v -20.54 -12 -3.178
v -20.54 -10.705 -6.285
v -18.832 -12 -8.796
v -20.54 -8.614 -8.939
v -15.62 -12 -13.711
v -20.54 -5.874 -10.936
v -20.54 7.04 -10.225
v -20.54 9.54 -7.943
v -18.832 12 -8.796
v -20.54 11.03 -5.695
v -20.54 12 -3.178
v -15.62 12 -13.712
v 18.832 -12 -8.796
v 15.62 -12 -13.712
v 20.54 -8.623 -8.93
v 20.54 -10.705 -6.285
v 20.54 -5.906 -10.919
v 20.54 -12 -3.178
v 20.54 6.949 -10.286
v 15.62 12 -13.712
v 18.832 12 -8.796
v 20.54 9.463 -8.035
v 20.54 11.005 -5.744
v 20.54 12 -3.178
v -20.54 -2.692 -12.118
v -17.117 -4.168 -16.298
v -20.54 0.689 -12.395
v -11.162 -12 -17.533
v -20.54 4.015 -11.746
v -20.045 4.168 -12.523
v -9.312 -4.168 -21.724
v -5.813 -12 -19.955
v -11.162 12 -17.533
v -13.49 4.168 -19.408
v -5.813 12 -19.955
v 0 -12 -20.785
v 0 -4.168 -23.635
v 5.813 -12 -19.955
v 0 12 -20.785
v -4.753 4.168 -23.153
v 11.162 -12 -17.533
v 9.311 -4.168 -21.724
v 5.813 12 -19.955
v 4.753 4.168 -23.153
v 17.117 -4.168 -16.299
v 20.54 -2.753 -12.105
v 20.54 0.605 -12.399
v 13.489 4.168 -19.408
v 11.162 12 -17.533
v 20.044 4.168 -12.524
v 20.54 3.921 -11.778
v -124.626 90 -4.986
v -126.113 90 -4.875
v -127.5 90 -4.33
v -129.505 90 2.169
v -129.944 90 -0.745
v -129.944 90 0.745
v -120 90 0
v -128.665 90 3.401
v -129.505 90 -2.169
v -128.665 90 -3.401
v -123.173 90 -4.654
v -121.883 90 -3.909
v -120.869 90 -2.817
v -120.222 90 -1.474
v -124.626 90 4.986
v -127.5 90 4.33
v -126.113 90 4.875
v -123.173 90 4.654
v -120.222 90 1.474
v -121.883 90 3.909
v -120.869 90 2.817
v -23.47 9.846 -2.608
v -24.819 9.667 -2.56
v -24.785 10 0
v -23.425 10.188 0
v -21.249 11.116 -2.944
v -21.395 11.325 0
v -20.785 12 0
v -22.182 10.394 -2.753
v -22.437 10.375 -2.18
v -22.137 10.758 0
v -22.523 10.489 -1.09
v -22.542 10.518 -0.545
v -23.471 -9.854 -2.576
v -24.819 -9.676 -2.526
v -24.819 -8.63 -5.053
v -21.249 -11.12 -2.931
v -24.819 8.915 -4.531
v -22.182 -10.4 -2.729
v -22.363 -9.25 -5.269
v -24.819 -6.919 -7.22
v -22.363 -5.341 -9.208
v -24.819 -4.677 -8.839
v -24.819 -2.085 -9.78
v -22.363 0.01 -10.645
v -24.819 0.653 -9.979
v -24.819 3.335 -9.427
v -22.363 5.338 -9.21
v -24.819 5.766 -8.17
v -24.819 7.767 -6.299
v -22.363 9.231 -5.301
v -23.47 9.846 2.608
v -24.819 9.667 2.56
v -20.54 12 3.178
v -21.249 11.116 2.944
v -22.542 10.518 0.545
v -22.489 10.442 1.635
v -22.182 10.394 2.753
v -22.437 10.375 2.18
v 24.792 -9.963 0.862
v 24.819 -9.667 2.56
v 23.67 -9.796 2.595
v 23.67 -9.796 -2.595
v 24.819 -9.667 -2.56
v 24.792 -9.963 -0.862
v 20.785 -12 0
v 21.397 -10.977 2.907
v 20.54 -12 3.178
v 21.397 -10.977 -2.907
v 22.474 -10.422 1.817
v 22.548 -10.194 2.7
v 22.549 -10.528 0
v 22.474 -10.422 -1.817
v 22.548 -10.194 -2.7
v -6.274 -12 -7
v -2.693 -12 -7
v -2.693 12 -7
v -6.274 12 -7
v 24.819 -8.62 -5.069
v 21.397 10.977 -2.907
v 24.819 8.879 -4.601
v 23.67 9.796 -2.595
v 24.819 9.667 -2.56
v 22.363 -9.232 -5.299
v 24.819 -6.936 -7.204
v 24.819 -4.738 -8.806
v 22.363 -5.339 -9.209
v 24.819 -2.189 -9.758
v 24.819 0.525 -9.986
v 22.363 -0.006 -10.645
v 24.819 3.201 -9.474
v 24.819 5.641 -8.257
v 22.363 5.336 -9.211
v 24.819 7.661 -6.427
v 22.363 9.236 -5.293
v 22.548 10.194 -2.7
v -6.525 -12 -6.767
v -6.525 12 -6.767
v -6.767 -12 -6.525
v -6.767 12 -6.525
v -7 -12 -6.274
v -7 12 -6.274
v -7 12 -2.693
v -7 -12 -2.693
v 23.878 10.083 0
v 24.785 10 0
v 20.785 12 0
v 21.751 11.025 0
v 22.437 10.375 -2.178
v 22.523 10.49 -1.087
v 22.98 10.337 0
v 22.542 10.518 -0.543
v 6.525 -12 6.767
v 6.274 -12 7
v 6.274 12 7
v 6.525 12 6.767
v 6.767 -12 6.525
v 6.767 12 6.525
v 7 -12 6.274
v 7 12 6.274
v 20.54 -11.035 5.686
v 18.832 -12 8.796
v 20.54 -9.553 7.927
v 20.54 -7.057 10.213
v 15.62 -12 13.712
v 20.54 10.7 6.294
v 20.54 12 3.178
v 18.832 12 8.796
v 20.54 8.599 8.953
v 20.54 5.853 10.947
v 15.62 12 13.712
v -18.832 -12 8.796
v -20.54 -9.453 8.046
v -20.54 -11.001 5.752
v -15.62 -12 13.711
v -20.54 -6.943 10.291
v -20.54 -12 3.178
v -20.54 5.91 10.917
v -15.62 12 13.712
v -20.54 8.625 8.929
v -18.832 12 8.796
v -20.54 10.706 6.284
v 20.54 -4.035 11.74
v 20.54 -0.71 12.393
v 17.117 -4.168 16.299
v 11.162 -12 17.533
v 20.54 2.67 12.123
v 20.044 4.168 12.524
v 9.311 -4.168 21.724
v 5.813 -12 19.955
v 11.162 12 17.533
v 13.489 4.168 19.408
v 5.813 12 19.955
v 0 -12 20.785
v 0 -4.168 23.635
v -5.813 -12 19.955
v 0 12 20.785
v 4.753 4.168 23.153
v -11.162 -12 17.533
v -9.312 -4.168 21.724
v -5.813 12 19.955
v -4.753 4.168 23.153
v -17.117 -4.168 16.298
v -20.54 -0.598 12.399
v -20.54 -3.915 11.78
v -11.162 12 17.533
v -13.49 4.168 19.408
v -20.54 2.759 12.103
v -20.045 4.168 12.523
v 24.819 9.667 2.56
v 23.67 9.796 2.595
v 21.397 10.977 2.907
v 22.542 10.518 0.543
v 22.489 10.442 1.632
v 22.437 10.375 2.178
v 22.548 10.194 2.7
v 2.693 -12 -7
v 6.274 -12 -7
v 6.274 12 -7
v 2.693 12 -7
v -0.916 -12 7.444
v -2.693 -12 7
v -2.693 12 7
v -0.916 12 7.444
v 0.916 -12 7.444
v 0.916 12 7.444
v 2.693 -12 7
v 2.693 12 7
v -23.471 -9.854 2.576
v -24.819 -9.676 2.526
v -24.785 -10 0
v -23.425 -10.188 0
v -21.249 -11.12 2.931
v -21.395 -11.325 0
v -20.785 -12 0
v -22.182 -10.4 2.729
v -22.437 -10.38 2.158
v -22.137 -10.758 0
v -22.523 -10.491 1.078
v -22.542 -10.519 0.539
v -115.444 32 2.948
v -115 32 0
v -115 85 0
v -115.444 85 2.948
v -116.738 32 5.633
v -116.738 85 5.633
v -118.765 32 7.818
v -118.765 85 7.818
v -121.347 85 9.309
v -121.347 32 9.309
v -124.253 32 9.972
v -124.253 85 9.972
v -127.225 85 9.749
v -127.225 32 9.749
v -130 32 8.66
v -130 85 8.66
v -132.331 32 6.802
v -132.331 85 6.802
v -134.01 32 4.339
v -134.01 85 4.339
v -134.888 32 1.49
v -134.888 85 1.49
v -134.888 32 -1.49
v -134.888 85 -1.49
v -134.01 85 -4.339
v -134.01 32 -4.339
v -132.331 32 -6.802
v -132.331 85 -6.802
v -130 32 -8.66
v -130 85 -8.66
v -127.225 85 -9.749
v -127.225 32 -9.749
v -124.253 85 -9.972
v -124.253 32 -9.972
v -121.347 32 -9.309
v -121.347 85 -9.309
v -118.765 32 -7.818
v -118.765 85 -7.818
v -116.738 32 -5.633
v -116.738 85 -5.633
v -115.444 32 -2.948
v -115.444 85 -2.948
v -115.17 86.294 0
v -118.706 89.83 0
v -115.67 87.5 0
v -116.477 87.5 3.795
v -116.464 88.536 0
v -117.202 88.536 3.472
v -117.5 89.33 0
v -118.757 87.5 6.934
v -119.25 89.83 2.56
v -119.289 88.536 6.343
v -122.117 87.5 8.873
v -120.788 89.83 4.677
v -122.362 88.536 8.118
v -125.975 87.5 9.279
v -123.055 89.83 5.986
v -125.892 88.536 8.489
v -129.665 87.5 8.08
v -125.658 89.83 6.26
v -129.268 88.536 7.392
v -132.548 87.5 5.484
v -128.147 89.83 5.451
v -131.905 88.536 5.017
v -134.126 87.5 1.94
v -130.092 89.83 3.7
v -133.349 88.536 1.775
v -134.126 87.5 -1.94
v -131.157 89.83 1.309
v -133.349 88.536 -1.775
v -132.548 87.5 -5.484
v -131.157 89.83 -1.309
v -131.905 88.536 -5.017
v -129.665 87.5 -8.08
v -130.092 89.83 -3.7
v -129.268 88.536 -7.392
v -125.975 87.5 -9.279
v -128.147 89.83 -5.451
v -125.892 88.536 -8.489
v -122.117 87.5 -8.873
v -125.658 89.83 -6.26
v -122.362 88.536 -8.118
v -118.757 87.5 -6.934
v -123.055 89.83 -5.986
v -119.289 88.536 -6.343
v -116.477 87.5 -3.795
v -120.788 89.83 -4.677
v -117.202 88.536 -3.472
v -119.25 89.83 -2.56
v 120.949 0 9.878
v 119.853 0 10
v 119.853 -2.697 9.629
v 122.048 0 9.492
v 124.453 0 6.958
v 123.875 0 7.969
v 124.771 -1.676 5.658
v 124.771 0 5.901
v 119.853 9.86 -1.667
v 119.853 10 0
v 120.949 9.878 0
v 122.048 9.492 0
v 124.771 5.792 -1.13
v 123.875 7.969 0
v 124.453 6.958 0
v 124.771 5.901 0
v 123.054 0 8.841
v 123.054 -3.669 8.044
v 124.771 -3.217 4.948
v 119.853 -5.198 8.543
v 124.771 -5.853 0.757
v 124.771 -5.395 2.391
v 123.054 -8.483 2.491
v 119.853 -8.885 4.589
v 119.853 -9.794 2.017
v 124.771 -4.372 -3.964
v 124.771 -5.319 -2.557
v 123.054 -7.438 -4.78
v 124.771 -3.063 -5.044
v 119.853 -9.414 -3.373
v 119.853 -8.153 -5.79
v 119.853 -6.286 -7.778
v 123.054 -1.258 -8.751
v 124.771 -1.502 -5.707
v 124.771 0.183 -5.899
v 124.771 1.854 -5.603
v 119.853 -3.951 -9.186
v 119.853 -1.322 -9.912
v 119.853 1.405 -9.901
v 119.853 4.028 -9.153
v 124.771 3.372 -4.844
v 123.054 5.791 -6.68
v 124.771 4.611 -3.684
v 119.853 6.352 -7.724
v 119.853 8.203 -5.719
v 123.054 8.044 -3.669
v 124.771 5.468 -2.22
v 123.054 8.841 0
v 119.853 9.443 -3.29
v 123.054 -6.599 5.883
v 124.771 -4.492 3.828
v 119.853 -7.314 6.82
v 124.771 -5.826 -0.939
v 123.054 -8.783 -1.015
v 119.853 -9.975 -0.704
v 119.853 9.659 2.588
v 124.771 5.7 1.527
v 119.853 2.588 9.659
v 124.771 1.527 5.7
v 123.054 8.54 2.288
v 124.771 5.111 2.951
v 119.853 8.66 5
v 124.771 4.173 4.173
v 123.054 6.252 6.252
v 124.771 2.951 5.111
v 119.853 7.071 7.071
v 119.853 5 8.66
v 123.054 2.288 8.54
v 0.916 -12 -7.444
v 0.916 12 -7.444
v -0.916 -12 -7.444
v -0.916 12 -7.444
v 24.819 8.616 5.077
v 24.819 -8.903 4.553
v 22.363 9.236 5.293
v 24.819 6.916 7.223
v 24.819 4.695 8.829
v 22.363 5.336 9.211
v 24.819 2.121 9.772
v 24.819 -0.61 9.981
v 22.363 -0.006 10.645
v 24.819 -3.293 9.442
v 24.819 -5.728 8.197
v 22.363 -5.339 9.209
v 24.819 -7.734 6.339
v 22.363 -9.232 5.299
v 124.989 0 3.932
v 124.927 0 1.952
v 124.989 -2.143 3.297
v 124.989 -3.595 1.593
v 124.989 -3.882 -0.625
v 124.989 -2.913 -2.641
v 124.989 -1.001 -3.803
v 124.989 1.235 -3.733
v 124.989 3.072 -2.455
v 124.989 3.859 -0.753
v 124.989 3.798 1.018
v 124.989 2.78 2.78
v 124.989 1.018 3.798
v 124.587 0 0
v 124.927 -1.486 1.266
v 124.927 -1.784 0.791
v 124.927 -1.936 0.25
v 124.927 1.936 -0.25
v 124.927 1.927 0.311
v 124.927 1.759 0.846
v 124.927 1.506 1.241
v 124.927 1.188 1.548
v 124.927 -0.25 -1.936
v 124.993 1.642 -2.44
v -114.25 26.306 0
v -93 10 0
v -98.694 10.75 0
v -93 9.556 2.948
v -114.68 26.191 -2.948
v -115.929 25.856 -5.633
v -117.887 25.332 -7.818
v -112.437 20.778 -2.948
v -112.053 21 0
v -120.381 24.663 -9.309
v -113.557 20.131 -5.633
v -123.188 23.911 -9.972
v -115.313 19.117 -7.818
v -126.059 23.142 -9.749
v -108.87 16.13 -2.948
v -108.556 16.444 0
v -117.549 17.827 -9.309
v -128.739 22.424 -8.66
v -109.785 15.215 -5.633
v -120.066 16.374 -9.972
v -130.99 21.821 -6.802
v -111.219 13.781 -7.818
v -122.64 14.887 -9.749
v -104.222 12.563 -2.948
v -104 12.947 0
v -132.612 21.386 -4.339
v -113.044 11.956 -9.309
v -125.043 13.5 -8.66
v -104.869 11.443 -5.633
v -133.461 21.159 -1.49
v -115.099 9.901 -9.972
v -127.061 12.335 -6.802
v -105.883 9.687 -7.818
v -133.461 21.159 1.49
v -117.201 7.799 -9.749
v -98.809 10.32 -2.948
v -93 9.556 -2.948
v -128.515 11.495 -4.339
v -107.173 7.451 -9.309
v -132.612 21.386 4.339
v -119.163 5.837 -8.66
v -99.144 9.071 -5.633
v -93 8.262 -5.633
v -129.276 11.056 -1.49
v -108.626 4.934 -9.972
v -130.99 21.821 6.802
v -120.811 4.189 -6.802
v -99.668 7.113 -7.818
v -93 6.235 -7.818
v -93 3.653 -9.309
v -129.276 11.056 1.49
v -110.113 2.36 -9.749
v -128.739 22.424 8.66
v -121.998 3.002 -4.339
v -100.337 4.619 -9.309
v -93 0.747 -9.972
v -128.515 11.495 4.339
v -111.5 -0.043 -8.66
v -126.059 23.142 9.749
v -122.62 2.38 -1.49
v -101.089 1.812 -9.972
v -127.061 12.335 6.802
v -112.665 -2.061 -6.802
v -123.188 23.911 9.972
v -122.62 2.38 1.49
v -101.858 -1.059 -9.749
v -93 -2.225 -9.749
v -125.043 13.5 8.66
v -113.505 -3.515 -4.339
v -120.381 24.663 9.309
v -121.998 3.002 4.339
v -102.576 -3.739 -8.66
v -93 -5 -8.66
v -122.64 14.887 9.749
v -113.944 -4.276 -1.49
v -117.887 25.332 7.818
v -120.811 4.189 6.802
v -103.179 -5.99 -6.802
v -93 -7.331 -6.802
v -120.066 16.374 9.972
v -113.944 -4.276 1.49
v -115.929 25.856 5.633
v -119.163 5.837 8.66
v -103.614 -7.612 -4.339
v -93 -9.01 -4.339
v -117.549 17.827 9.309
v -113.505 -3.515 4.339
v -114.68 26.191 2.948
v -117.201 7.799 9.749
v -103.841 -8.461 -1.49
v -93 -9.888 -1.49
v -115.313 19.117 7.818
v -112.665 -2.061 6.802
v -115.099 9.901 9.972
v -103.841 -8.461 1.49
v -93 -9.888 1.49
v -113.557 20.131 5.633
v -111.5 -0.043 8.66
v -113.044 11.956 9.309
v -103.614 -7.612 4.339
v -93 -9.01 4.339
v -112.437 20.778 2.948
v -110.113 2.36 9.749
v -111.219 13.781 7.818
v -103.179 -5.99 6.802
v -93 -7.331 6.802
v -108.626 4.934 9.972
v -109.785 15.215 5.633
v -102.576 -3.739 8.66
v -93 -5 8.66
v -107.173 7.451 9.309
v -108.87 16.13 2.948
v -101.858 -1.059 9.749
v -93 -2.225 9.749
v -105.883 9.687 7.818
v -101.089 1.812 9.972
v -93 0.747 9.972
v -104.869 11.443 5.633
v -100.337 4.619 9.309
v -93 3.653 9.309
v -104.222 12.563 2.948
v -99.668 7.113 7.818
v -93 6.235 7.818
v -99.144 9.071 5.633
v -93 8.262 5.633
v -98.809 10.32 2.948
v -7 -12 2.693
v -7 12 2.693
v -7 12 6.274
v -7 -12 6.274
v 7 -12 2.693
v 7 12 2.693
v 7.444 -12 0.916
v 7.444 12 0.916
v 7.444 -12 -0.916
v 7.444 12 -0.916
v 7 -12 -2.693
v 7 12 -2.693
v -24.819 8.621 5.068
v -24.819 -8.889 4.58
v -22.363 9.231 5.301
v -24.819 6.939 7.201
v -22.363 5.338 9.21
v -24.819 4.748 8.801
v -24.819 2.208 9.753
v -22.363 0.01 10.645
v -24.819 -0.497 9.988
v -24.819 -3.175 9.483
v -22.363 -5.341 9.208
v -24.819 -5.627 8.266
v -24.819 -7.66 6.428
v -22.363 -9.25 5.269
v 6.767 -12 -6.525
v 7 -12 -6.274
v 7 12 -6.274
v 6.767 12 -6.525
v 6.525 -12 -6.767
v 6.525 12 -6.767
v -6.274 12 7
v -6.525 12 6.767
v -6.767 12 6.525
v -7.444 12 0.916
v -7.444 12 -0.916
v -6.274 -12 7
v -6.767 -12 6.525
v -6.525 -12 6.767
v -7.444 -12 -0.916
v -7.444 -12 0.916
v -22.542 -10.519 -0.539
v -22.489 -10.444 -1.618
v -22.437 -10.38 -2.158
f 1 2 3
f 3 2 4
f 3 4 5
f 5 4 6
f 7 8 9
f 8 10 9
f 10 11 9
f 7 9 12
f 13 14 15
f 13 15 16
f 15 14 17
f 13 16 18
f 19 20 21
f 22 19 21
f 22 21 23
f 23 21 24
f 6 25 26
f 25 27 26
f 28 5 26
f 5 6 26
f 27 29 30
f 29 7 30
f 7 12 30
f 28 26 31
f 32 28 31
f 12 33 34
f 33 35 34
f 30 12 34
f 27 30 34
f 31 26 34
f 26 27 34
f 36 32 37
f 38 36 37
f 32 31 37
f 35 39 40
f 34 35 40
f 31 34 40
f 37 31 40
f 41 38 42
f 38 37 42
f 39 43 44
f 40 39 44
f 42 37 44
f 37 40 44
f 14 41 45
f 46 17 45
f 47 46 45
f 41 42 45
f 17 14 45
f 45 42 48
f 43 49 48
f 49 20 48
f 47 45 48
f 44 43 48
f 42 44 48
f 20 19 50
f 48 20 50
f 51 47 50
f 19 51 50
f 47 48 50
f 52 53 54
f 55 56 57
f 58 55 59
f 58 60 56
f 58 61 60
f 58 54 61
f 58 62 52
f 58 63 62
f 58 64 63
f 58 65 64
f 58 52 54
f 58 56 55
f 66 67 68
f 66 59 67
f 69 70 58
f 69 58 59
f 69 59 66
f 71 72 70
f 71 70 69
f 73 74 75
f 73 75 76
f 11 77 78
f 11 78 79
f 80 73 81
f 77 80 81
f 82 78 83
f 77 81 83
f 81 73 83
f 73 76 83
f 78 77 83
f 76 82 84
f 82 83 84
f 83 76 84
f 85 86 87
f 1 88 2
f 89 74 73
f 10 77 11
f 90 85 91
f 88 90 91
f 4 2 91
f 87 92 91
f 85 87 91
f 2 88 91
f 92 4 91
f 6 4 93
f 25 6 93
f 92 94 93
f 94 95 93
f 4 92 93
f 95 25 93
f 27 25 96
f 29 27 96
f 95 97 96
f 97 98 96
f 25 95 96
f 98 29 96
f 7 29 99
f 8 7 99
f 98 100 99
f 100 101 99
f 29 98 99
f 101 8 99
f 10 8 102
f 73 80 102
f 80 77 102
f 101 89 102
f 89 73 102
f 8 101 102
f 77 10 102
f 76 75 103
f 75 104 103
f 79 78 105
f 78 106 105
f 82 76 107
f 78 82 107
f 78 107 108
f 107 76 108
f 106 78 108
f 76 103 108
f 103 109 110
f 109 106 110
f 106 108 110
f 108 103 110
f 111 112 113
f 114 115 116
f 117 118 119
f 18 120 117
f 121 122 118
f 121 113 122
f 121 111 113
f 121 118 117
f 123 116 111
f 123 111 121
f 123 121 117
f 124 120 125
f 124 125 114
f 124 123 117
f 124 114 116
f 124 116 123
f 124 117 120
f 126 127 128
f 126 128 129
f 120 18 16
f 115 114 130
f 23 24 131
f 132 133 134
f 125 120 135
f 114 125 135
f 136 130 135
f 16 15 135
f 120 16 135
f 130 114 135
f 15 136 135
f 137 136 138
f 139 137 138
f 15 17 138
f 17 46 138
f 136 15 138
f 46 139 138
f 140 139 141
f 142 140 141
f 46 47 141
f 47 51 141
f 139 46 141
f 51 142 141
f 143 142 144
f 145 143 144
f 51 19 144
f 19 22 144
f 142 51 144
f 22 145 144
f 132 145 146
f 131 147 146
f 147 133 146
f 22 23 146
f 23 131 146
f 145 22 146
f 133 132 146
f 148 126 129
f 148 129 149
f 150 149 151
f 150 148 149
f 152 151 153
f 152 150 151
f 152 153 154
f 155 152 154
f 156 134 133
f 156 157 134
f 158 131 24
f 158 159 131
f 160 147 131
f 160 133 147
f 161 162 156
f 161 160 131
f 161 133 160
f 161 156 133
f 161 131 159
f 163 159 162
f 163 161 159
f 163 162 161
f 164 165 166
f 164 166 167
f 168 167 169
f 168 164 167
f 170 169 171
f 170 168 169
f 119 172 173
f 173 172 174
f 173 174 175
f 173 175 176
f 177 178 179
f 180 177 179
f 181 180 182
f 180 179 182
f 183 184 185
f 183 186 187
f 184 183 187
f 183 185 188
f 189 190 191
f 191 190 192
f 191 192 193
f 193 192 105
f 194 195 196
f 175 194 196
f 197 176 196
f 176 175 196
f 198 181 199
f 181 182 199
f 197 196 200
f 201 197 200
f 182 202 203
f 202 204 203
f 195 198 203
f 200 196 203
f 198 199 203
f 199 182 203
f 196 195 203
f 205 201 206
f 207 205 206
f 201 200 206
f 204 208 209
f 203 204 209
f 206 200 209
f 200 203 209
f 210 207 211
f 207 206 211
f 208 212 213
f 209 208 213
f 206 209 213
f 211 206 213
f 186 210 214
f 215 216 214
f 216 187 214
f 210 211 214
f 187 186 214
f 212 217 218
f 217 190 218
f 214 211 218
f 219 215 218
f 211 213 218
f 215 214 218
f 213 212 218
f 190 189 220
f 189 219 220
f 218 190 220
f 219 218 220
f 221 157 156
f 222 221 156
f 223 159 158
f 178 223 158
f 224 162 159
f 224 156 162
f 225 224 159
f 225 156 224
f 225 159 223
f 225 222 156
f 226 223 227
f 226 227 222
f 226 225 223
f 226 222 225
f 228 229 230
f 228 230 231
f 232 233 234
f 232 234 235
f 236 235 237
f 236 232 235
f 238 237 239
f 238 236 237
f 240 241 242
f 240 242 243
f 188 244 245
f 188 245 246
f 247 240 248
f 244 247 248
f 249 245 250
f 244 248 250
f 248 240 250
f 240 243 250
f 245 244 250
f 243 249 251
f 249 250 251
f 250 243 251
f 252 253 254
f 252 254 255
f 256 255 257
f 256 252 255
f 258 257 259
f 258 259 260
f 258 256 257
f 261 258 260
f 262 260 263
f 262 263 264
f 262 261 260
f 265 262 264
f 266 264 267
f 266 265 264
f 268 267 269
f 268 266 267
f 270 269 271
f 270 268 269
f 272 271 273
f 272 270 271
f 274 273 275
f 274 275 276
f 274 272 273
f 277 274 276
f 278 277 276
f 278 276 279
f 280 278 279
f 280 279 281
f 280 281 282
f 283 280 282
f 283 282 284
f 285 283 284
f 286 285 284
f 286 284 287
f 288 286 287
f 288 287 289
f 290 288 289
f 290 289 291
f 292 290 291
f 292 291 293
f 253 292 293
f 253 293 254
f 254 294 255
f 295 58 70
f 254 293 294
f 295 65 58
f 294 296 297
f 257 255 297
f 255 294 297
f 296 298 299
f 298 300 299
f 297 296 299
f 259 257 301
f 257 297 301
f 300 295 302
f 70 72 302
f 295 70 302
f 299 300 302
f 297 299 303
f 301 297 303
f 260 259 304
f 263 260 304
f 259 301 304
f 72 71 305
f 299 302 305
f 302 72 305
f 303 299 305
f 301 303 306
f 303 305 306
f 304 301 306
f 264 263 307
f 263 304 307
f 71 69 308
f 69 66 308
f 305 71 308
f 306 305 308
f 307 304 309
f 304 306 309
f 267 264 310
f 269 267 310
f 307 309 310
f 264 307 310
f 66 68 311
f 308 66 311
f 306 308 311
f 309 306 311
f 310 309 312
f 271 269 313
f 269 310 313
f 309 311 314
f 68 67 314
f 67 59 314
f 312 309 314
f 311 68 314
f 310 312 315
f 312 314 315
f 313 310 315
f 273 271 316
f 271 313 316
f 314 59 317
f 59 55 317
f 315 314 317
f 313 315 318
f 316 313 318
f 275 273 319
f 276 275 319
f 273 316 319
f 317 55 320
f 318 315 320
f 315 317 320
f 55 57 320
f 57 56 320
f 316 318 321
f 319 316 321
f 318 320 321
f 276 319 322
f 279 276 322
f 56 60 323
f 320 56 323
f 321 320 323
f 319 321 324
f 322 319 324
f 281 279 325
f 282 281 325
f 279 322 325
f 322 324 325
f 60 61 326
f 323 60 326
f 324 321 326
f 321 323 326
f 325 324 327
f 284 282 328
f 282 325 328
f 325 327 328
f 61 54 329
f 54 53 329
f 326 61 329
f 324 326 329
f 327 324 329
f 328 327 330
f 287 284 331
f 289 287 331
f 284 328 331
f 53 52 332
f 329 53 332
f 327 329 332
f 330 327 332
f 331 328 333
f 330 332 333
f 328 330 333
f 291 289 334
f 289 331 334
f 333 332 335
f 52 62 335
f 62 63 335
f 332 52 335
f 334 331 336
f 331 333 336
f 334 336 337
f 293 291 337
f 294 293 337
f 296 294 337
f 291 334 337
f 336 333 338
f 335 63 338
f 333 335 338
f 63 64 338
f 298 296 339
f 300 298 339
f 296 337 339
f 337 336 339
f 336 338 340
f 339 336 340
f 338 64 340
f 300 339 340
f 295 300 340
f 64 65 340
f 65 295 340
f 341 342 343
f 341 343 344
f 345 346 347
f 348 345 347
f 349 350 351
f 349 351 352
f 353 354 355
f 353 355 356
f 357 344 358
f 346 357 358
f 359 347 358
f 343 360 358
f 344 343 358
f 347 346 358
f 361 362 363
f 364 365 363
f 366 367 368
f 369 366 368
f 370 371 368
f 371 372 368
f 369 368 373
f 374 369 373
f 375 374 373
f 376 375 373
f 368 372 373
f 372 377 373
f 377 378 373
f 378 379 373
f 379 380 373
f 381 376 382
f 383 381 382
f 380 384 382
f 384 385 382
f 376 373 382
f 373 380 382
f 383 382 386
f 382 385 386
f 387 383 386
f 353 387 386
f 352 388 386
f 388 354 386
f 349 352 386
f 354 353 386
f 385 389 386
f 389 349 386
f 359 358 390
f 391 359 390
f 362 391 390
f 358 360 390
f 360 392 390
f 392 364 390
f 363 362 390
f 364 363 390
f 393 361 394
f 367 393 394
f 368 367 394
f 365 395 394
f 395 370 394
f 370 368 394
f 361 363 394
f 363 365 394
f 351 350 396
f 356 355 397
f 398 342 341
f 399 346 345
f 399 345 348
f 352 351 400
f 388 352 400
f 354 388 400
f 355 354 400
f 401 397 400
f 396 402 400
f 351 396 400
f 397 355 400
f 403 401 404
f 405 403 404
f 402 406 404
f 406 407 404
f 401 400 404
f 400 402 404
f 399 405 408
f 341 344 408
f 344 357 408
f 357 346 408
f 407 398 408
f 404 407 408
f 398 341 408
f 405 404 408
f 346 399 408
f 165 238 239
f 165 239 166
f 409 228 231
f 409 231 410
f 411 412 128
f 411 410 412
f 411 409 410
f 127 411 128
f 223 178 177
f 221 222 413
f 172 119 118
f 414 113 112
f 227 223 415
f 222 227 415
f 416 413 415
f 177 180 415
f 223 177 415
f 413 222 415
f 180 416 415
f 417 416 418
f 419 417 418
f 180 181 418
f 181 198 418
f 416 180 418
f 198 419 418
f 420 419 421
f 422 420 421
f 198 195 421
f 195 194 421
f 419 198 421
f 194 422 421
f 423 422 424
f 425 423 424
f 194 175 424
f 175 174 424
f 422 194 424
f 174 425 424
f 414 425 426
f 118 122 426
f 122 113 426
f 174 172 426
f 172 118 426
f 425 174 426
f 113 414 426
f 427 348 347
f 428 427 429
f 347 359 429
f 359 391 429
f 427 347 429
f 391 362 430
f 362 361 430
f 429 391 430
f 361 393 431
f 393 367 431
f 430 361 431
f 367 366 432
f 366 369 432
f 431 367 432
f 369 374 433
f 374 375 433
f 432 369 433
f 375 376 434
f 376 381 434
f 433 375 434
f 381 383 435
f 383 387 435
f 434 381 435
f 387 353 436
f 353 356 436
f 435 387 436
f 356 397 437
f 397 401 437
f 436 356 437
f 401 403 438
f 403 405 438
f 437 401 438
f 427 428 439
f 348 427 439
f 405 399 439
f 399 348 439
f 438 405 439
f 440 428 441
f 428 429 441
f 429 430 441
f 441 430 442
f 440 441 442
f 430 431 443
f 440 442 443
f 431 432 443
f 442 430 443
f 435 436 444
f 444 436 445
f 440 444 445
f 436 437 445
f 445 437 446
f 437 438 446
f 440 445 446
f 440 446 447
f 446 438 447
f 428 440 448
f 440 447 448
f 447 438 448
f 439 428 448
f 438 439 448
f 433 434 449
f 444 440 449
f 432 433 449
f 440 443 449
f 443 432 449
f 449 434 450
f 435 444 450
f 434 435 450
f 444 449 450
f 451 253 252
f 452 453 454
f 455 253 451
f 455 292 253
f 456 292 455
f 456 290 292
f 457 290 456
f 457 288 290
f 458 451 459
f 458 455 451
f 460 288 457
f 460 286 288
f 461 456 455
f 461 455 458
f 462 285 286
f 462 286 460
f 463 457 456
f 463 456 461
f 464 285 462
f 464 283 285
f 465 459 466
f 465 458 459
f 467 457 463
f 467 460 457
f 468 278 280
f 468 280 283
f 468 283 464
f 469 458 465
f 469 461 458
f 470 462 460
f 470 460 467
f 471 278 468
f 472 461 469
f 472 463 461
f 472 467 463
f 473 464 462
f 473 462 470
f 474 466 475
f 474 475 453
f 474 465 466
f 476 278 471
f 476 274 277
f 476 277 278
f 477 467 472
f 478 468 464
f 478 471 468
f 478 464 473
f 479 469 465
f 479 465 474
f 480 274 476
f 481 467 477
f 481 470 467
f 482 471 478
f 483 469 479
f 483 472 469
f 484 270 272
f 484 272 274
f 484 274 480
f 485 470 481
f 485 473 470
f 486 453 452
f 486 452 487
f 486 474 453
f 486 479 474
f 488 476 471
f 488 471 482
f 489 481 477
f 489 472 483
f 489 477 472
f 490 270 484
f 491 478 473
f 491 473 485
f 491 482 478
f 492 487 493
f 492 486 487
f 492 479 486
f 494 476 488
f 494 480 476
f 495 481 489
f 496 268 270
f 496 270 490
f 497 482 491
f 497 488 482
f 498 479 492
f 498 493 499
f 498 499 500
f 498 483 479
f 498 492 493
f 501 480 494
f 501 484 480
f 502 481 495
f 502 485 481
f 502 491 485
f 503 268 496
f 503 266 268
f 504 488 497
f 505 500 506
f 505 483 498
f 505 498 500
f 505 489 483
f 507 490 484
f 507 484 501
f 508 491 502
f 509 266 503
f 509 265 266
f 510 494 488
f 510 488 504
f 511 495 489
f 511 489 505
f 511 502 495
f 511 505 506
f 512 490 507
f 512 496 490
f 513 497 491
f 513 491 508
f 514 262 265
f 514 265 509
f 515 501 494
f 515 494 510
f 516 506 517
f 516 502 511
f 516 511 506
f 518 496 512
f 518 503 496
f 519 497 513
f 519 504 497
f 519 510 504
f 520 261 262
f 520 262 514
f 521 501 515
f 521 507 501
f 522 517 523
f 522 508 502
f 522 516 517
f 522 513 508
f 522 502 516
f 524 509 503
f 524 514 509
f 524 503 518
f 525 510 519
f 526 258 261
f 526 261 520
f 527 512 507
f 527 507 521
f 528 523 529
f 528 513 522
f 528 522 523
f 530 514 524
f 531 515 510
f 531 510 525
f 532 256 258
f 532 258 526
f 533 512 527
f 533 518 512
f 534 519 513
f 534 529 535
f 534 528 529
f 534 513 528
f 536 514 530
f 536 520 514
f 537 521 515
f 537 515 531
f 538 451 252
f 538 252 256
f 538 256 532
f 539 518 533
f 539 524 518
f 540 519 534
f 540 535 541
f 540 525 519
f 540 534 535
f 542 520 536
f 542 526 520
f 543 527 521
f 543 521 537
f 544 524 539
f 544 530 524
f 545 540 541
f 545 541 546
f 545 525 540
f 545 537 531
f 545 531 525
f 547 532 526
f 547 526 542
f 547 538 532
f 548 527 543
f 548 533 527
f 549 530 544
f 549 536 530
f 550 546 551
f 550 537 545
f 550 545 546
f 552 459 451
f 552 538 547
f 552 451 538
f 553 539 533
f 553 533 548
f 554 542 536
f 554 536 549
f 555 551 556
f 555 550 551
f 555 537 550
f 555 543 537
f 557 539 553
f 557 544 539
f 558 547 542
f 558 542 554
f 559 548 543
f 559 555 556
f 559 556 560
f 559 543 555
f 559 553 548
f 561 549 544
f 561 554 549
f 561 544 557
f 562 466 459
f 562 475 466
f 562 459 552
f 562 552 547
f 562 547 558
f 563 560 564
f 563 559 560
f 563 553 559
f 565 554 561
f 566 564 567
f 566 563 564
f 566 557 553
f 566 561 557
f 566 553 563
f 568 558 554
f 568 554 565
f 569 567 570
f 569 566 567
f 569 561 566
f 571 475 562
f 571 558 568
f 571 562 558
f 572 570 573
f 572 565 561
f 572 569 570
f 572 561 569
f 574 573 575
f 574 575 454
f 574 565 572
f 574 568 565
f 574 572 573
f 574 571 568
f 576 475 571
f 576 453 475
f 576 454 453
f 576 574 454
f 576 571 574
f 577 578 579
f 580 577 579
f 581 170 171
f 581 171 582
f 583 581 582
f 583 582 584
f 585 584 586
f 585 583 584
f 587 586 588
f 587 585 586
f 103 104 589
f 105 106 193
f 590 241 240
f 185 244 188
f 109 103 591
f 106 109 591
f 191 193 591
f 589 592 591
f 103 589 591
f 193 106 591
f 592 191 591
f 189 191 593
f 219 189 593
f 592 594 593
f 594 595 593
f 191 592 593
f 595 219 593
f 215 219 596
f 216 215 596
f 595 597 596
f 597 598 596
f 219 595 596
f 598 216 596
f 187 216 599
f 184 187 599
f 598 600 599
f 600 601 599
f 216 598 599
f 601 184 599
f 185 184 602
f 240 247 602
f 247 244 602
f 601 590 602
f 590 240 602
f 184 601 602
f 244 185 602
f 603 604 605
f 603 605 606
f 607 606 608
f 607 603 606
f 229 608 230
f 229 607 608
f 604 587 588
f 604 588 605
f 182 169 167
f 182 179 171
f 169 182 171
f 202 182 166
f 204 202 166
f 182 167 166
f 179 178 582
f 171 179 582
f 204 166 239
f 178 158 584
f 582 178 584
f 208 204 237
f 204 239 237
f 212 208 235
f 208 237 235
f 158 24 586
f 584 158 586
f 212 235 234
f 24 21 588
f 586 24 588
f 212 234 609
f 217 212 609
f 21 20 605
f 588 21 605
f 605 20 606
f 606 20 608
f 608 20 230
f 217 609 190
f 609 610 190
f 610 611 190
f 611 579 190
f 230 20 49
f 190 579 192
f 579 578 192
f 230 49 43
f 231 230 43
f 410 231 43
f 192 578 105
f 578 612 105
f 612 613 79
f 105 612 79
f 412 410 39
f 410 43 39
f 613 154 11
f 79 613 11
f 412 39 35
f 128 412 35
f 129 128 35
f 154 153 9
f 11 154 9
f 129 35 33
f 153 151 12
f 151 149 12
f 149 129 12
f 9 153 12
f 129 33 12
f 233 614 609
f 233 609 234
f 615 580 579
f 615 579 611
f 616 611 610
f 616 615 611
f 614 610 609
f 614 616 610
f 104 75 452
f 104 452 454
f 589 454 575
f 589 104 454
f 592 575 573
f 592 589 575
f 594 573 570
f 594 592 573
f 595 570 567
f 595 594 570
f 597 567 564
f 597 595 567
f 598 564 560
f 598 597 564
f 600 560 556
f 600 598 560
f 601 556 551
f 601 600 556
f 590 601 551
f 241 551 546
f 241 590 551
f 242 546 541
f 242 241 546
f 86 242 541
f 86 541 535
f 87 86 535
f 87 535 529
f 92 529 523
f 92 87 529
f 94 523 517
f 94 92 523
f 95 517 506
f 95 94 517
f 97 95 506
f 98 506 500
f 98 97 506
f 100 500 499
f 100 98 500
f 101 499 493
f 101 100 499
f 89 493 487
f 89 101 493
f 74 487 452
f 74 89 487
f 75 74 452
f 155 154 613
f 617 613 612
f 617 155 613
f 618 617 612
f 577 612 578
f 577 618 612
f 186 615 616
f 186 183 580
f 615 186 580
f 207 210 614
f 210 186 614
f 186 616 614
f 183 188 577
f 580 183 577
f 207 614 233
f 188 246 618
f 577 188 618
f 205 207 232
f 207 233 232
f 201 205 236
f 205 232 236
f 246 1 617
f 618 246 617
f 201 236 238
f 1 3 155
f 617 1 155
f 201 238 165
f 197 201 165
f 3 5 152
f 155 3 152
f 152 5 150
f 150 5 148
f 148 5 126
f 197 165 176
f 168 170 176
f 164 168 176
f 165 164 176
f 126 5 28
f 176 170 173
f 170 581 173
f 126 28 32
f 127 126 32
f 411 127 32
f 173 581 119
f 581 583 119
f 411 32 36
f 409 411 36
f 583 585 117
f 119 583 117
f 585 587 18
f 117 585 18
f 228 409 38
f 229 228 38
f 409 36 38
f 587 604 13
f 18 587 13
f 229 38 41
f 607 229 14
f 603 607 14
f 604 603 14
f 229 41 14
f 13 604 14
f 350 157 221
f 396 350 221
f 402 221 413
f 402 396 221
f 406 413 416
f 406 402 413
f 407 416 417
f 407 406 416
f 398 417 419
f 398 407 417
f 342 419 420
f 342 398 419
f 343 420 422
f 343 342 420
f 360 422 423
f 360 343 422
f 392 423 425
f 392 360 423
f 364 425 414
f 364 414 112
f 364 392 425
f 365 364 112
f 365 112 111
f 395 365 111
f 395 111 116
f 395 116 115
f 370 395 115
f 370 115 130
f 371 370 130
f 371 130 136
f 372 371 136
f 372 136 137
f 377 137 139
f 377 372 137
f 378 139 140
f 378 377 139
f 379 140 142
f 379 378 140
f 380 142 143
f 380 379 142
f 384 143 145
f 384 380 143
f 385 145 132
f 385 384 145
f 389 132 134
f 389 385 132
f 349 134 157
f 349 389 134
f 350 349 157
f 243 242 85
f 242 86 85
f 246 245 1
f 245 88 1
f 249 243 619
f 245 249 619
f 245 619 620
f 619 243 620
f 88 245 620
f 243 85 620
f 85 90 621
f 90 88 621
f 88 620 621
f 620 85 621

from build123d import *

# Parameters (mm, degrees)
SKETCH_2_R               = 9.999999999999993
FILLET_1_R               = 5
CUT_EXTRUDE_1_DEPTH      = 165.01524327634917
CUT_EXTRUDE_1_DEPTH_BACK = 165.01524327634917


with BuildPart() as part:
    # По траектории1: sweep along a path in Эскиз1
    with BuildLine(Plane.XY) as sweep_1_path:
        Line((-125, 90), (-125, 31.999999999999993))
        ThreePointArc((-125, 31.999999999999993), (-115.62741699796952, 9.372583002030478), (-93, 0))
        Line((-93, 0), (124.99999999999999, 0))
    # Эскиз2 → По траектории1 (sweep)
    with BuildSketch(Plane(origin=(0, 90, 0), x_dir=(1, 0, 0), z_dir=(0, 1, 0))):
        with Locations((-125, 0)):
            Circle(SKETCH_2_R)
    sweep(path=sweep_1_path.line)

    # Эскиз3 → Повернуть1 (revolve)
    with BuildSketch(Plane.XY):
        with BuildLine():
            Line((4.49e-15, 12), (4.49e-15, -12))
            Line((4.49e-15, -12), (-20.784609690826528, -12))
            ThreePointArc((-20.784609690826528, -12), (-24, 2.94e-15), (-20.784609690826528, 12))
            Line((-20.784609690826528, 12), (4.49e-15, 12))
        make_face()
    revolve(axis=Axis((4.49e-15, 20.353481922740002, 0), (-1.1e-16, -1, 0)))

    # Эскиз6 → Вырез-Повернуть1 (revolve, cut)
    with BuildSketch(Plane.XY, mode=Mode.PRIVATE) as cut_revolve_1_sk:
        with BuildLine():
            Line((123.3345611656252, 10.000000000000009), (253.93494063523158, 10.000000000000009))
            Line((253.93494063523158, 10.000000000000009), (253.93494063523158, 0))
            Line((253.93494063523158, 0), (124.58650256653851, 0))
            ThreePointArc((124.58650256653851, 0), (124.89155809301906, 5.116559027883884), (123.3345611656252, 10.000000000000009))
        make_face()
    revolve(cut_revolve_1_sk.sketch.rotate(Axis((-23.23871769146635, 0, 0), (1, 0, 0)), 90), axis=Axis((-23.23871769146635, 0, 0), (1, 0, 0)), mode=Mode.SUBTRACT)

    # Скругление1
    fillet_1_edges = [part.edges().sort_by_distance(p)[0] for p in [
        (-135, 90, 1.22e-15),
    ]]
    fillet(fillet_1_edges, radius=FILLET_1_R)
    fillet_1_2_edges = [part.edges().sort_by_distance(p)[0] for p in [
        (-21.81742422927143, 2.45e-15, 9.999999999999993),
        (-21.81742422927143, -1.22e-15, -9.999999999999993),
    ]]
    fillet(fillet_1_2_edges, radius=FILLET_1_R - 0.0001)  # a hair under: the kernel refuses the full size
    fillet_1_3_edges = [part.edges().sort_by_distance(p)[0] for p in [
        (21.817424229271403, -9.999999999999993, 3.06e-15),
    ]]
    fillet(fillet_1_3_edges, radius=FILLET_1_R)
    fillet_1_4_edges = [part.edges().sort_by_distance(p)[0] for p in [
        (123.33456116562522, 7.071067811865514, 7.071067811865446),
        (123.33456116562522, -7.07106781186551, -7.071067811865451),
    ]]
    fillet(fillet_1_4_edges, radius=FILLET_1_R)

    # Эскиз7 → Вырез-Вытянуть1 (cut, two sides: drawn at the far end of the back side and taken through both)
    with BuildSketch(Plane(origin=(0, 0, 0), x_dir=(1, 0, 0), z_dir=(0, 1, 0)).offset(-CUT_EXTRUDE_1_DEPTH_BACK)):
        with BuildLine():
            ThreePointArc((-6.999999999999877, -6.273754856543386), (-6.646803743153483, -6.646803743153611), (-6.273754856543252, -6.999999999999998))
            Line((-6.273754856543248, -7.000000000000002), (-2.6925824035672585, -7.000000000000006))
            ThreePointArc((-2.692582403567258, -6.999999999999998), (-3.242e-14, -7.5), (2.6925824035671977, -7.000000000000021))
            Line((2.692582403567193, -7.000000000000002), (6.2737548565430865, -7.000000000000002))
            ThreePointArc((6.273754856543118, -7.000000000000118), (6.646803743153469, -6.646803743153625), (6.999999999999976, -6.273754856543277))
            Line((6.999999999999987, -6.273754856543277), (6.999999999999956, -2.6925824035677124))
            ThreePointArc((6.999999999999835, -2.692582403567684), (7.500000000000001, 1.33e-15), (6.999999999999835, 2.6925824035676857))
            Line((6.999999999999997, 2.692582403567716), (6.999999999999997, 6.27375485654329))
            ThreePointArc((6.999999999999971, 6.273754856543282), (6.646803743153472, 6.6468037431536215), (6.273754856543124, 7.000000000000112))
            Line((6.2737548565430865, 6.999999999999998), (2.6925824035671964, 6.999999999999998))
            ThreePointArc((2.6925824035671995, 7.000000000000021), (-3.331e-14, 7.500000000000001), (-2.692582403567263, 6.9999999999999964))
            Line((-2.692582403567263, 7.0000000000000036), (-6.27375485654325, 6.999999999999999))
            ThreePointArc((-6.273754856543249, 7), (-6.646803743153482, 6.646803743153612), (-6.999999999999876, 6.273754856543388))
            Line((-7.000000000000003, 6.273754856543425), (-7.000000000000003, 2.692582403567693))
            ThreePointArc((-6.999999999999842, 2.692582403567664), (-7.5, -2.22e-15), (-6.99999999999984, -2.692582403567666))
            Line((-6.99999999999992, -2.6925824035676946), (-6.999999999999922, -6.273754856543425))
        make_face()
    extrude(amount=CUT_EXTRUDE_1_DEPTH + CUT_EXTRUDE_1_DEPTH_BACK, mode=Mode.SUBTRACT)


solid = part.part
